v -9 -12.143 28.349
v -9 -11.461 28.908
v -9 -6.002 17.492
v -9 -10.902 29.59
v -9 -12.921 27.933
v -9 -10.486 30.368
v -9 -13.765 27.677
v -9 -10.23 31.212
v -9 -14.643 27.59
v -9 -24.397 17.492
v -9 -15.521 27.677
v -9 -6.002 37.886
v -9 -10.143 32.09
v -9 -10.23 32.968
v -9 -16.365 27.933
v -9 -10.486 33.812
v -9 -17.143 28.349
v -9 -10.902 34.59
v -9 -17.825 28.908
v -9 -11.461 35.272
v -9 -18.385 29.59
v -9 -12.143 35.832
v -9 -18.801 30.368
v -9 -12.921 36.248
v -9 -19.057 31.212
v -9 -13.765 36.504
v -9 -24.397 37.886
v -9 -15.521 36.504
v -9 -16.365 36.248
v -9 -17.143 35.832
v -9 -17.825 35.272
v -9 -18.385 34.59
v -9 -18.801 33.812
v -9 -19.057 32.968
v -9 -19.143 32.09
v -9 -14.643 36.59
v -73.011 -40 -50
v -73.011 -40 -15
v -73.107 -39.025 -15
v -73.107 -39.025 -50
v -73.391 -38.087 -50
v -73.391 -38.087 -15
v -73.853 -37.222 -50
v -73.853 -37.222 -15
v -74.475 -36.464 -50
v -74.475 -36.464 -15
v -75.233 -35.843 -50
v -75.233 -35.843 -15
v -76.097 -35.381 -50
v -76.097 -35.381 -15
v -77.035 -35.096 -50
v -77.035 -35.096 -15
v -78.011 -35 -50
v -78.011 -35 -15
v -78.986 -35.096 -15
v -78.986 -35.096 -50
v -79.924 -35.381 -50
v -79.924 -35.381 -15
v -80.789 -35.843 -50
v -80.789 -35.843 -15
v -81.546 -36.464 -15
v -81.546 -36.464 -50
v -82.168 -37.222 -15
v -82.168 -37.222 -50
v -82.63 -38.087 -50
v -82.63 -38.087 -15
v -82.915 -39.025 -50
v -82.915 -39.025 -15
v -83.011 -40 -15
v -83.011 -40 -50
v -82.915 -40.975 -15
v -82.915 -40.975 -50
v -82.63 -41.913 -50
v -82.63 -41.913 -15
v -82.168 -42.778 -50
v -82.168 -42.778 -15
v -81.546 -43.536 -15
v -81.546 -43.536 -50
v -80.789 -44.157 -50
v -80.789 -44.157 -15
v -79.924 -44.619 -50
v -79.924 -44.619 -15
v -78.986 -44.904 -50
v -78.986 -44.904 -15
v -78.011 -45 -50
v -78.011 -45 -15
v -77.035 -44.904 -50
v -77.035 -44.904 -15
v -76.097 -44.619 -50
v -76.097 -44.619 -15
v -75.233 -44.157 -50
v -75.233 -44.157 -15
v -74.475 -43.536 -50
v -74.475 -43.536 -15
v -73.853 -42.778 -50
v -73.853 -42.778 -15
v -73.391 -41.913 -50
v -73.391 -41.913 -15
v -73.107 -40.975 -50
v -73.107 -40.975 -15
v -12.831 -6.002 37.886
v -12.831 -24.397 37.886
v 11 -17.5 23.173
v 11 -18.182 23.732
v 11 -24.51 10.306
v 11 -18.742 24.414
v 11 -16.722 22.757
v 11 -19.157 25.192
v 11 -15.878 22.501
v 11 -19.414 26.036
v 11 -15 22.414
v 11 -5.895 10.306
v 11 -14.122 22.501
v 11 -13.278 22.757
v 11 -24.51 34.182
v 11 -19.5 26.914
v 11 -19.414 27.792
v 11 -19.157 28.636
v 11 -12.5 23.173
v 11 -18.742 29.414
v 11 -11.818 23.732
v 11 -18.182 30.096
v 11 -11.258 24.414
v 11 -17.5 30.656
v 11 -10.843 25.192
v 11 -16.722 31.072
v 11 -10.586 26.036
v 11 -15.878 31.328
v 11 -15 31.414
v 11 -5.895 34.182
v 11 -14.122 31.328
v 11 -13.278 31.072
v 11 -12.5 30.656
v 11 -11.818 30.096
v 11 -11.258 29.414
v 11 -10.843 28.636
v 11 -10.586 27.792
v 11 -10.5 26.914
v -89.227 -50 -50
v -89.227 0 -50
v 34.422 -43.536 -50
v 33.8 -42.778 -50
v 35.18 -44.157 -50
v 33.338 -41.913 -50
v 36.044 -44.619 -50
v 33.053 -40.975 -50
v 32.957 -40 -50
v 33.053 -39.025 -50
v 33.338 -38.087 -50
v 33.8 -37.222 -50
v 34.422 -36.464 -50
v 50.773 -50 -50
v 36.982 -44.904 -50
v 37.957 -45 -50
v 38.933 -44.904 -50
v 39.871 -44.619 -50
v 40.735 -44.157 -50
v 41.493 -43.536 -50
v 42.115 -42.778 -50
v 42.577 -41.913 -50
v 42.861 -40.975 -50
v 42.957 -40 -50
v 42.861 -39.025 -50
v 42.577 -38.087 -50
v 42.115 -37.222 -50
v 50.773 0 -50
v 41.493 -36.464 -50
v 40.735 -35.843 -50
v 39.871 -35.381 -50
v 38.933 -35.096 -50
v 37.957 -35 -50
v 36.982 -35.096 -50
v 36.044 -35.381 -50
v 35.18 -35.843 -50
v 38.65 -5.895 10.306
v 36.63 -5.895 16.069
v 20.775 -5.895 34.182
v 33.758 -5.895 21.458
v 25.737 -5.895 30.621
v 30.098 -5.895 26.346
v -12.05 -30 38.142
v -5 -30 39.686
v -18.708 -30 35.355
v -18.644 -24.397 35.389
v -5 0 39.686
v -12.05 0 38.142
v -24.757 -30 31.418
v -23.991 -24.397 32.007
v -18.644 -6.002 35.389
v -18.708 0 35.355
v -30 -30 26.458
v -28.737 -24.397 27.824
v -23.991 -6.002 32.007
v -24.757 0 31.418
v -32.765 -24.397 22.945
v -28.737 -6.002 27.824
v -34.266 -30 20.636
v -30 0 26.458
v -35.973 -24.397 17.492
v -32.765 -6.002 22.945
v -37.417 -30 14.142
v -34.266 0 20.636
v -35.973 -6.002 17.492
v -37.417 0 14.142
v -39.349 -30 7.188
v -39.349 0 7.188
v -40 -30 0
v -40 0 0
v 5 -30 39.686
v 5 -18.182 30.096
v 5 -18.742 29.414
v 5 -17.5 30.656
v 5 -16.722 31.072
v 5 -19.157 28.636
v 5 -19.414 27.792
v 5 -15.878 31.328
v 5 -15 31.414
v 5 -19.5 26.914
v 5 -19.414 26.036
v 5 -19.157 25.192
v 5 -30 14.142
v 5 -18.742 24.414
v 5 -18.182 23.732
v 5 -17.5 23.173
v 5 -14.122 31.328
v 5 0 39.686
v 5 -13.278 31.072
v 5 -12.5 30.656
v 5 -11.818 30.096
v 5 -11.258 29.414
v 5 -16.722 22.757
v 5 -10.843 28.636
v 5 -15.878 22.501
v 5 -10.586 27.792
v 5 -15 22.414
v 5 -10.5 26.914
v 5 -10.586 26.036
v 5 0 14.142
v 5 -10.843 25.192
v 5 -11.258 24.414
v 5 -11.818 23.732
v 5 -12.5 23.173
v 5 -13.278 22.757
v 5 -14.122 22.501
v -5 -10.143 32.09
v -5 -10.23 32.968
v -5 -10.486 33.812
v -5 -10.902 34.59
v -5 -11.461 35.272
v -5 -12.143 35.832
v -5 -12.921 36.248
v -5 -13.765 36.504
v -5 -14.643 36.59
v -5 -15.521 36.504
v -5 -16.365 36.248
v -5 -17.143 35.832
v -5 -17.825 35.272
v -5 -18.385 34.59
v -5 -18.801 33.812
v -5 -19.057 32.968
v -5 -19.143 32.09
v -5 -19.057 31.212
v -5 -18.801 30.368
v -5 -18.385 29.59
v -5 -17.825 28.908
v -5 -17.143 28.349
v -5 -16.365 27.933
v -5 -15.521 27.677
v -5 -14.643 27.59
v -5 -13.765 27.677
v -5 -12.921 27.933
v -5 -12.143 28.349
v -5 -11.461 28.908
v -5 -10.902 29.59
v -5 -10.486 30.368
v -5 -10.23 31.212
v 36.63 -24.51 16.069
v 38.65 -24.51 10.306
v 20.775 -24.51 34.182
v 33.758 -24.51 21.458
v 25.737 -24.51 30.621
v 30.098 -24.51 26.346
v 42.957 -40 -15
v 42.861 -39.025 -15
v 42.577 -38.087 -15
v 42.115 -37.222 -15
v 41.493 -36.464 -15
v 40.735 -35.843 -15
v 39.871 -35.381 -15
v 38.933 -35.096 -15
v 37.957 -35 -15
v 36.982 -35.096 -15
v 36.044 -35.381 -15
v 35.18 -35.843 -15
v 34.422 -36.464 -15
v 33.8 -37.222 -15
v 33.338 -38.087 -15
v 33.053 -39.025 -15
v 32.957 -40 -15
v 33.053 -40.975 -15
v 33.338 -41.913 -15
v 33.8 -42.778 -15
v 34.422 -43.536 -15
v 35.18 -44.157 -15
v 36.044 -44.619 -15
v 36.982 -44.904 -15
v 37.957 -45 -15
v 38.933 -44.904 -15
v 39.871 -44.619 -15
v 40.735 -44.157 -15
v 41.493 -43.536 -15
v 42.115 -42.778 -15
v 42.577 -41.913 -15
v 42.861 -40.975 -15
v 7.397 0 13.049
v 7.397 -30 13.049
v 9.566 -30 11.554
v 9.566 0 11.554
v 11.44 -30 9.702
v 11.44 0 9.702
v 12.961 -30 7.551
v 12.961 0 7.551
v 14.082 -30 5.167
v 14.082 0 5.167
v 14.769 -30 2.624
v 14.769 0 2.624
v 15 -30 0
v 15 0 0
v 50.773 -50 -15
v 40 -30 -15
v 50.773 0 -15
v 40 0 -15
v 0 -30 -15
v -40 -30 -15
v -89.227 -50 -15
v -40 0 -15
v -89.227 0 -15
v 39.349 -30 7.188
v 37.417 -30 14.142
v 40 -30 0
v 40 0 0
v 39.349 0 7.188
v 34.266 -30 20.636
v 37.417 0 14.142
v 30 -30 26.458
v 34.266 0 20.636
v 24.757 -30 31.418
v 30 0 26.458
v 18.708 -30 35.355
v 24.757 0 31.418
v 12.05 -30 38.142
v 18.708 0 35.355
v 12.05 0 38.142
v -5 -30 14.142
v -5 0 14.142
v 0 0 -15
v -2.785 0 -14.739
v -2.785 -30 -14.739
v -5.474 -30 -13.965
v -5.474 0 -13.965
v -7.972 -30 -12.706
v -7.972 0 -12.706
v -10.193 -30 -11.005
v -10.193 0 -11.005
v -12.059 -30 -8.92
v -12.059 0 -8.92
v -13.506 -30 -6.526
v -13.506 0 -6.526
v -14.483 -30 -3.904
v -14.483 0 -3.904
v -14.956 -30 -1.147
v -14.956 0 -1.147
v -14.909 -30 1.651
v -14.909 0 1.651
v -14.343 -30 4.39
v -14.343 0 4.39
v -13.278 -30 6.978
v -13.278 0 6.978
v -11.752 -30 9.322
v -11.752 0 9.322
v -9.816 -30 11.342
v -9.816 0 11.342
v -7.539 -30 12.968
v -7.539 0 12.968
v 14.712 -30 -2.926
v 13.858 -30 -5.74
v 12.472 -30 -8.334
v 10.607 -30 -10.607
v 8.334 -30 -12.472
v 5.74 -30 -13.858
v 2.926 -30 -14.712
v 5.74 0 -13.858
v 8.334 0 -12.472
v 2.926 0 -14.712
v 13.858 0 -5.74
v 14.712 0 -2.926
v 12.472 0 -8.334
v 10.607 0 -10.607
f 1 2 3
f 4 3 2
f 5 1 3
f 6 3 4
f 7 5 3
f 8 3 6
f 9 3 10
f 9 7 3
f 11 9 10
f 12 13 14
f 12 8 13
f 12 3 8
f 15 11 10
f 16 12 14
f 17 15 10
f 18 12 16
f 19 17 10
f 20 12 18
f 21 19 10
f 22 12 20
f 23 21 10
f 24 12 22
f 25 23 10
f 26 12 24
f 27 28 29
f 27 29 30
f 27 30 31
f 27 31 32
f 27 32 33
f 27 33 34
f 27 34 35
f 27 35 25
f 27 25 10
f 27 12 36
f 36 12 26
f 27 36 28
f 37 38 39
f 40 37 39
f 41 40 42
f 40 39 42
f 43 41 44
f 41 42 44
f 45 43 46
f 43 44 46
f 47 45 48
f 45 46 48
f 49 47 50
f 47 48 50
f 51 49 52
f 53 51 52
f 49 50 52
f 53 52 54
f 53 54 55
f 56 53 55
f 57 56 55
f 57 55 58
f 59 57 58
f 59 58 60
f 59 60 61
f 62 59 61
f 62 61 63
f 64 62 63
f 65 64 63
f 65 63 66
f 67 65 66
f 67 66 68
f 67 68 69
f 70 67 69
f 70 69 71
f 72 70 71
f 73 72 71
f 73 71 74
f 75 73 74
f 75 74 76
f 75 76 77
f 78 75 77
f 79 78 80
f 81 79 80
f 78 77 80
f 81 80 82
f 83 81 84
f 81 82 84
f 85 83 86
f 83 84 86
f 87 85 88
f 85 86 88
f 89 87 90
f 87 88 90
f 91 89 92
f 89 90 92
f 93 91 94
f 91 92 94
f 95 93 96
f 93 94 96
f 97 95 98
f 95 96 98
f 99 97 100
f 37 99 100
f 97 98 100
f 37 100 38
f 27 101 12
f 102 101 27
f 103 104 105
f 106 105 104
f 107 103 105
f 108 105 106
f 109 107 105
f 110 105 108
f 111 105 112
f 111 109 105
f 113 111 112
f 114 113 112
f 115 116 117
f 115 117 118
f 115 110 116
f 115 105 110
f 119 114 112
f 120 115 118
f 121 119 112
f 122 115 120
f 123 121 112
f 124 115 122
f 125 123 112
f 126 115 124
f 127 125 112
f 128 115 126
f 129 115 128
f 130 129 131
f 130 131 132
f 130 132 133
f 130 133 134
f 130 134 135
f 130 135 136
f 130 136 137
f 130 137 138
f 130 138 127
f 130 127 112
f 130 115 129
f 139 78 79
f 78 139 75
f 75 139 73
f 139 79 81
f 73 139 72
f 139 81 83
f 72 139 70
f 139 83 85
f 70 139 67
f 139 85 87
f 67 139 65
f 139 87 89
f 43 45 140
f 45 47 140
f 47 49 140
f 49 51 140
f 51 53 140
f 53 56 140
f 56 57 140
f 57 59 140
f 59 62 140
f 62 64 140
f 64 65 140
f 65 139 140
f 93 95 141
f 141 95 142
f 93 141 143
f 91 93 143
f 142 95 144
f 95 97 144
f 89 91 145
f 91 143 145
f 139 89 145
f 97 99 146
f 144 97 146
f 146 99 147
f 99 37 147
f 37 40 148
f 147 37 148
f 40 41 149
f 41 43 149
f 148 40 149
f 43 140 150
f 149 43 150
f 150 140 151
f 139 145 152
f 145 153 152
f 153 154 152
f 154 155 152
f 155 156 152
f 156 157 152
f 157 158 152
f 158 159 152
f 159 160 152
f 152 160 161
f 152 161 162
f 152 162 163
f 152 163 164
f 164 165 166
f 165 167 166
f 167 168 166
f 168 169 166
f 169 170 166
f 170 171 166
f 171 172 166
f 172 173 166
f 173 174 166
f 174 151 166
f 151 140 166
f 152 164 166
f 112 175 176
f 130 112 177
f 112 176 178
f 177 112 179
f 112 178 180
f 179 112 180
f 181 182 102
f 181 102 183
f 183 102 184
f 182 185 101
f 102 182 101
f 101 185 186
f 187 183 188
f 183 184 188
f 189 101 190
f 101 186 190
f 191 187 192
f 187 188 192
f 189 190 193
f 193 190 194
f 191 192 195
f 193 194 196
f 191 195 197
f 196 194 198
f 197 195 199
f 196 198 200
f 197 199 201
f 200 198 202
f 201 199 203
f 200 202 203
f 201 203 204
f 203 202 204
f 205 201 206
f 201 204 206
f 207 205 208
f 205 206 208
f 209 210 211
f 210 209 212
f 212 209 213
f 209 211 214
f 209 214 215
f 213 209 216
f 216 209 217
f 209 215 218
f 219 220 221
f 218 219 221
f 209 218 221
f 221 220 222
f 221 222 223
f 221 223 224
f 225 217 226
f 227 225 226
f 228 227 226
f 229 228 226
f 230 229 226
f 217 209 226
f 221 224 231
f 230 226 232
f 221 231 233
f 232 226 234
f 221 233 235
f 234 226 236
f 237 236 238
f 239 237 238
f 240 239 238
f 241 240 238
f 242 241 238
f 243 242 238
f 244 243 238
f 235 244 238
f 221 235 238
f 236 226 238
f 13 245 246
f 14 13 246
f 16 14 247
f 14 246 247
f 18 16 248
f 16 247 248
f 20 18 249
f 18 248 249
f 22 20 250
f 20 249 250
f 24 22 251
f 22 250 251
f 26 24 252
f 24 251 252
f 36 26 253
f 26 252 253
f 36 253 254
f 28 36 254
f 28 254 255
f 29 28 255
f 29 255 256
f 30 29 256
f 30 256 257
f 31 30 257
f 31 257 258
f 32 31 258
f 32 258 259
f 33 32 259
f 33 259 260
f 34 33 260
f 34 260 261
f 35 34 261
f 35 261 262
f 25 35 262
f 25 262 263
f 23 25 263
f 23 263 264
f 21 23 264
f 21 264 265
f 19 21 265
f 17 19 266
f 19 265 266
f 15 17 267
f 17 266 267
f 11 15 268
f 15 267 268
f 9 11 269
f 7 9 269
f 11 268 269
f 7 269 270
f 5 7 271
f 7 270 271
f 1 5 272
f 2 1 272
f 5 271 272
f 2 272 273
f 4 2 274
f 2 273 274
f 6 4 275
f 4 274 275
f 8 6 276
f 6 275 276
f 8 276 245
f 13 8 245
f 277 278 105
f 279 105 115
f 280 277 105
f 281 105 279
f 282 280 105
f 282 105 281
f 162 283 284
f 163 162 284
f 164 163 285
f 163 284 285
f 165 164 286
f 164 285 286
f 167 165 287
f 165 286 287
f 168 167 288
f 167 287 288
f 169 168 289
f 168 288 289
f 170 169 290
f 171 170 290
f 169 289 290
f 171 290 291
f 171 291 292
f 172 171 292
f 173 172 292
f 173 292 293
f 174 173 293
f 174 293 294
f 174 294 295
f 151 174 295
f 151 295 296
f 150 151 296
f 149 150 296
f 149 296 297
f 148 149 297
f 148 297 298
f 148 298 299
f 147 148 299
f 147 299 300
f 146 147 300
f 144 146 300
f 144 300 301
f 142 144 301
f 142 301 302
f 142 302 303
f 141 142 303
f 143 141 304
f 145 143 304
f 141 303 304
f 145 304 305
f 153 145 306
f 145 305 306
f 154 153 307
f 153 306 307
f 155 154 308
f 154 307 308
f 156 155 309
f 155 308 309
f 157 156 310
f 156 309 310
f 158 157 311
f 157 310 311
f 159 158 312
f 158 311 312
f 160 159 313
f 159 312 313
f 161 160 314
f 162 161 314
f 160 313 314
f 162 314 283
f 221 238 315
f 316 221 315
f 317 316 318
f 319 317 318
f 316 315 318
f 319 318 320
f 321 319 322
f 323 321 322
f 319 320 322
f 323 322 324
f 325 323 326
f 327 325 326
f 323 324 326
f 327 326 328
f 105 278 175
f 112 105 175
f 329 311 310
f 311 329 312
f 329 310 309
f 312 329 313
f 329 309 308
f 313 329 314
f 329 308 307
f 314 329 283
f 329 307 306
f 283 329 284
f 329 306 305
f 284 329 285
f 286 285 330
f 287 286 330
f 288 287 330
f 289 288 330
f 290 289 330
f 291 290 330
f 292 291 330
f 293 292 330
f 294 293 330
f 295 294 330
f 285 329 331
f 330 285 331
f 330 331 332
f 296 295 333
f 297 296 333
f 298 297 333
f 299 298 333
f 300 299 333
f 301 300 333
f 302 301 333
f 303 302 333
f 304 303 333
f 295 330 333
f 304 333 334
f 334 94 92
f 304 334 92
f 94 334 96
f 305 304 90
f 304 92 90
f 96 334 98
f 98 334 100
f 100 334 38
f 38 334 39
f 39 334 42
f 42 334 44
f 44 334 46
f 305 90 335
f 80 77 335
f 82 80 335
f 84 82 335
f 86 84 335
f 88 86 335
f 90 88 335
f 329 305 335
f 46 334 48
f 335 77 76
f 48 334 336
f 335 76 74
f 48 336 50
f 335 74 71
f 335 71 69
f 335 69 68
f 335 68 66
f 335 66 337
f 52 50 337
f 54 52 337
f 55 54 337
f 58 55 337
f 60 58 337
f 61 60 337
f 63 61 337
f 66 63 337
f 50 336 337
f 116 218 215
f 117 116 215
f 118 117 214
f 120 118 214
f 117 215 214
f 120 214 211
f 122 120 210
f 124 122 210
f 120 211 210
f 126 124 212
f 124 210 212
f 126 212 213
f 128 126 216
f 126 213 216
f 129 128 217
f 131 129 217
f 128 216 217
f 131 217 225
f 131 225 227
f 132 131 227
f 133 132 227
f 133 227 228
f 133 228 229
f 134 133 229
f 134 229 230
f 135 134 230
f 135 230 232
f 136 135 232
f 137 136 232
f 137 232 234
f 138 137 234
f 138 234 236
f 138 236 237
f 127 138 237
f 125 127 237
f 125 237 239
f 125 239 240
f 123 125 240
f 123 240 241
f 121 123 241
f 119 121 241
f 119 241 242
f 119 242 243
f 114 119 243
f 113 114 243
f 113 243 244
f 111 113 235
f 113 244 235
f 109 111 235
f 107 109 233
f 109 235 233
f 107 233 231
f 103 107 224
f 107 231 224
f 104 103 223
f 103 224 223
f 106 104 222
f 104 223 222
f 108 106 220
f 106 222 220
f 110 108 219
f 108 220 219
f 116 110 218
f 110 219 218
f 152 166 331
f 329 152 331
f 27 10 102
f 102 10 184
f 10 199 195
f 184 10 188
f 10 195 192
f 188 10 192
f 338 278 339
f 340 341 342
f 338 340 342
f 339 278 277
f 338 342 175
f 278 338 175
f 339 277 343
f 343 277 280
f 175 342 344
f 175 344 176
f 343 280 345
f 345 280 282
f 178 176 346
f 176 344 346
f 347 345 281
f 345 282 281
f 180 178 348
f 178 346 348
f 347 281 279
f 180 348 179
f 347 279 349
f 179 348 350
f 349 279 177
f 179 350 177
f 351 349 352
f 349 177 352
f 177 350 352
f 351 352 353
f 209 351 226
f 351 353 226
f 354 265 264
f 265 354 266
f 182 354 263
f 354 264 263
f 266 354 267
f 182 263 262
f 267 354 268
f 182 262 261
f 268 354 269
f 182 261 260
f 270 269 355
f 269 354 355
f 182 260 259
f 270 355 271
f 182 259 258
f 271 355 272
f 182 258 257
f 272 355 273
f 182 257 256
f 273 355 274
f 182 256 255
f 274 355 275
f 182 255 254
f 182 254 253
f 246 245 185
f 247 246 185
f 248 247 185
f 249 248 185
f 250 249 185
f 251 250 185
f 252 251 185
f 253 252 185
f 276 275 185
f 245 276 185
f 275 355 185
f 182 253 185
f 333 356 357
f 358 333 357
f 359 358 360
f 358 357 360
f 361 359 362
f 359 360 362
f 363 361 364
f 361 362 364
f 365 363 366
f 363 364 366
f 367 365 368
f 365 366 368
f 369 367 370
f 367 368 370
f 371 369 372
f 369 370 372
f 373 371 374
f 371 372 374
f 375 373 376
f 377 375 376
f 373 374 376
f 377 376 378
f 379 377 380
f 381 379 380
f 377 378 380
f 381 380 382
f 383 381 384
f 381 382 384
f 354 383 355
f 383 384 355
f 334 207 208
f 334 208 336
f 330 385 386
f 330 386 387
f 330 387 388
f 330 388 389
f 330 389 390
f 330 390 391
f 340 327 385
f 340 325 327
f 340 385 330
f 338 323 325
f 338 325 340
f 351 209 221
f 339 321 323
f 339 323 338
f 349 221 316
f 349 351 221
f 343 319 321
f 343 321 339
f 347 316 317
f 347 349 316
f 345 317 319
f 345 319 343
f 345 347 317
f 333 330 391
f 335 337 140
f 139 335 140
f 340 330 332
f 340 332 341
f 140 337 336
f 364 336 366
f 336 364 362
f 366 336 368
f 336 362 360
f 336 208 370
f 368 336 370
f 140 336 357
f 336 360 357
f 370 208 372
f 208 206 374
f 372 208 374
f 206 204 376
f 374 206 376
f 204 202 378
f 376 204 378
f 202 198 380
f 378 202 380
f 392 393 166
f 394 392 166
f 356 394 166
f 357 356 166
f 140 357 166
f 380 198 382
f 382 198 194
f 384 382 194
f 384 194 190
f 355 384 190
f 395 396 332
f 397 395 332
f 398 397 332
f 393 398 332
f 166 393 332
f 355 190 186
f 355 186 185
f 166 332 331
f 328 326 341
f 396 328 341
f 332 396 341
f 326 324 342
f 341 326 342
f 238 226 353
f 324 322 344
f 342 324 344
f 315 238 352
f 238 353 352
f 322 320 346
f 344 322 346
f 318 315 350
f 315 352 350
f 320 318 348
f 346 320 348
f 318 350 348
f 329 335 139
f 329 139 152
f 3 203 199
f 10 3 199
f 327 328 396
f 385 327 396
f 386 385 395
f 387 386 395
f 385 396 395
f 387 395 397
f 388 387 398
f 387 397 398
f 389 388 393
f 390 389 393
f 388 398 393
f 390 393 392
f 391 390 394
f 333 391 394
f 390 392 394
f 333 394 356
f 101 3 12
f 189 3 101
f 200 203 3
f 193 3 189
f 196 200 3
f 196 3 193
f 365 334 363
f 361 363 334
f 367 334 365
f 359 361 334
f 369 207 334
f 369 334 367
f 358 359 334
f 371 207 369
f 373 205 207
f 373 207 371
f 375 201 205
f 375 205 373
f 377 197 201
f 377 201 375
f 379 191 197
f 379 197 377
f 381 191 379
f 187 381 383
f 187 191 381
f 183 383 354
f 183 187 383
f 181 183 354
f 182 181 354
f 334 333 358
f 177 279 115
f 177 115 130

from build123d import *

# Parameters (mm, degrees)
F1_DEPTH  = 50
F2_DEPTH  = 30
F3_R      = 4.5
F4_DEPTH  = 45.7741506228
F5_R      = 4.5
F6_DEPTH  = 84.2278493772
F7_R      = 5
F8_DEPTH  = 57
F9_W      = 18.3949293569
F9_H      = 20.3943792731
F10_DEPTH = 31
F11_W     = 18.6150614172
F11_H     = 23.8758381456
F12_DEPTH = 29


with BuildPart() as f1:
    # F0 (on Front) → F1 (new body)
    with BuildSketch(Plane.XZ):
        with BuildLine():
            Line((40, -15), (37.0809924355, -15))
            ThreePointArc((37.0809924355, -15), (0, -40), (-37.0809924355, -15))
            Line((-37.0809924355, -15), (-40, -15))
            Line((-40, -15), (-89.2268493772, -15))
            Line((-89.2268493772, -15), (-89.2268493772, -50))
            Line((-89.2268493772, -50), (50.7731506228, -50))
            Line((50.7731506228, -50), (50.7731506228, -15))
            Line((50.7731506228, -15), (40, -15))
        make_face()
        with BuildLine():
            Line((37.0809924355, -15), (0, -15))
            Line((0, -15), (-37.0809924355, -15))
            ThreePointArc((-37.0809924355, -15), (0, -40), (37.0809924355, -15))
        make_face()
    extrude(amount=F1_DEPTH)

    # F0 (on Front) → F2 (join)
    with BuildSketch(Plane.XZ):
        with BuildLine():
            Line((40, -15), (37.0809924355, -15))
            ThreePointArc((37.0809924355, -15), (0, -40), (-37.0809924355, -15))
            Line((-37.0809924355, -15), (-40, -15))
            Line((-40, -15), (-89.2268493772, -15))
            Line((-89.2268493772, -15), (-89.2268493772, -50))
            Line((-89.2268493772, -50), (50.7731506228, -50))
            Line((50.7731506228, -50), (50.7731506228, -15))
            Line((50.7731506228, -15), (40, -15))
        make_face()
        with BuildLine():
            Line((-37.0809924355, -15), (0, -15))
            ThreePointArc((0, -15), (-14.7839783948, -2.5365296809), (-5, 14.1421356237))
            Line((-5, 14.1421356237), (-5, 39.686269666))
            ThreePointArc((-5, 39.686269666), (-30, 26.4575131106), (-40, 0))
            ThreePointArc((-40, 0), (-39.2634671, -7.6406904983), (-37.0809924355, -15))
        make_face()
        with BuildLine():
            ThreePointArc((5, 14.1421356237), (12.2474487139, 8.6602540378), (15, 0))
            ThreePointArc((15, 0), (10.6066017178, -10.6066017178), (0, -15))
            Line((0, -15), (37.0809924355, -15))
            ThreePointArc((37.0809924355, -15), (39.2634671, -7.6406904983), (40, 0))
            ThreePointArc((40, 0), (30, 26.4575131106), (5, 39.686269666))
            Line((5, 39.686269666), (5, 14.1421356237))
        make_face()
        with BuildLine():
            Line((37.0809924355, -15), (0, -15))
            Line((0, -15), (-37.0809924355, -15))
            ThreePointArc((-37.0809924355, -15), (0, -40), (37.0809924355, -15))
        make_face()
        with BuildLine():
            Line((-40, -15), (-37.0809924355, -15))
            ThreePointArc((-37.0809924355, -15), (-39.2634671, -7.6406904983), (-40, 0))
            Line((-40, 0), (-40, -15))
        make_face()
        with BuildLine():
            ThreePointArc((40, 0), (39.2634671, -7.6406904983), (37.0809924355, -15))
            Line((37.0809924355, -15), (40, -15))
            Line((40, -15), (40, 0))
        make_face()
    extrude(amount=F2_DEPTH)

    # F3 (on face) → F4 (cut, through all)
    with BuildSketch(Plane(origin=(5, 0, 0), x_dir=(0, -1, 0), z_dir=(-1, 0, 0))):
        with Locations((15, 26.9142026448)):
            Circle(F3_R)
    extrude(amount=-F4_DEPTH, mode=Mode.SUBTRACT)

    # F5 (on face) → F6 (cut, through all)
    with BuildSketch(Plane.YZ.offset(-5)):
        with Locations((-14.6433338523, 32.090269666)):
            Circle(F5_R)
    extrude(amount=-F6_DEPTH, mode=Mode.SUBTRACT)

    # F7 (on face) → F8 (cut)
    with BuildSketch(Plane.XY.offset(-15)):
        with Locations((-78.0106559396, -40)):
            Circle(F7_R)
        with Locations((37.9573963583, -40)):
            Circle(F7_R)
    extrude(amount=-F8_DEPTH, mode=Mode.SUBTRACT)

    # F9 (on face) → F10 (cut)
    with BuildSketch(Plane(origin=(-40, 0, 0), x_dir=(0, -1, 0), z_dir=(-1, 0, 0))):
        with Locations((15.1999453083, 27.6889307424)):
            Rectangle(F9_W, F9_H)
    extrude(amount=-F10_DEPTH, mode=Mode.SUBTRACT)

    # F11 (on face) → F12 (cut)
    with BuildSketch(Plane.YZ.offset(40)):
        with Locations((-15.2023369446, 22.2436347976)):
            Rectangle(F11_W, F11_H)
    extrude(amount=-F12_DEPTH, mode=Mode.SUBTRACT)


solid = f1.part
